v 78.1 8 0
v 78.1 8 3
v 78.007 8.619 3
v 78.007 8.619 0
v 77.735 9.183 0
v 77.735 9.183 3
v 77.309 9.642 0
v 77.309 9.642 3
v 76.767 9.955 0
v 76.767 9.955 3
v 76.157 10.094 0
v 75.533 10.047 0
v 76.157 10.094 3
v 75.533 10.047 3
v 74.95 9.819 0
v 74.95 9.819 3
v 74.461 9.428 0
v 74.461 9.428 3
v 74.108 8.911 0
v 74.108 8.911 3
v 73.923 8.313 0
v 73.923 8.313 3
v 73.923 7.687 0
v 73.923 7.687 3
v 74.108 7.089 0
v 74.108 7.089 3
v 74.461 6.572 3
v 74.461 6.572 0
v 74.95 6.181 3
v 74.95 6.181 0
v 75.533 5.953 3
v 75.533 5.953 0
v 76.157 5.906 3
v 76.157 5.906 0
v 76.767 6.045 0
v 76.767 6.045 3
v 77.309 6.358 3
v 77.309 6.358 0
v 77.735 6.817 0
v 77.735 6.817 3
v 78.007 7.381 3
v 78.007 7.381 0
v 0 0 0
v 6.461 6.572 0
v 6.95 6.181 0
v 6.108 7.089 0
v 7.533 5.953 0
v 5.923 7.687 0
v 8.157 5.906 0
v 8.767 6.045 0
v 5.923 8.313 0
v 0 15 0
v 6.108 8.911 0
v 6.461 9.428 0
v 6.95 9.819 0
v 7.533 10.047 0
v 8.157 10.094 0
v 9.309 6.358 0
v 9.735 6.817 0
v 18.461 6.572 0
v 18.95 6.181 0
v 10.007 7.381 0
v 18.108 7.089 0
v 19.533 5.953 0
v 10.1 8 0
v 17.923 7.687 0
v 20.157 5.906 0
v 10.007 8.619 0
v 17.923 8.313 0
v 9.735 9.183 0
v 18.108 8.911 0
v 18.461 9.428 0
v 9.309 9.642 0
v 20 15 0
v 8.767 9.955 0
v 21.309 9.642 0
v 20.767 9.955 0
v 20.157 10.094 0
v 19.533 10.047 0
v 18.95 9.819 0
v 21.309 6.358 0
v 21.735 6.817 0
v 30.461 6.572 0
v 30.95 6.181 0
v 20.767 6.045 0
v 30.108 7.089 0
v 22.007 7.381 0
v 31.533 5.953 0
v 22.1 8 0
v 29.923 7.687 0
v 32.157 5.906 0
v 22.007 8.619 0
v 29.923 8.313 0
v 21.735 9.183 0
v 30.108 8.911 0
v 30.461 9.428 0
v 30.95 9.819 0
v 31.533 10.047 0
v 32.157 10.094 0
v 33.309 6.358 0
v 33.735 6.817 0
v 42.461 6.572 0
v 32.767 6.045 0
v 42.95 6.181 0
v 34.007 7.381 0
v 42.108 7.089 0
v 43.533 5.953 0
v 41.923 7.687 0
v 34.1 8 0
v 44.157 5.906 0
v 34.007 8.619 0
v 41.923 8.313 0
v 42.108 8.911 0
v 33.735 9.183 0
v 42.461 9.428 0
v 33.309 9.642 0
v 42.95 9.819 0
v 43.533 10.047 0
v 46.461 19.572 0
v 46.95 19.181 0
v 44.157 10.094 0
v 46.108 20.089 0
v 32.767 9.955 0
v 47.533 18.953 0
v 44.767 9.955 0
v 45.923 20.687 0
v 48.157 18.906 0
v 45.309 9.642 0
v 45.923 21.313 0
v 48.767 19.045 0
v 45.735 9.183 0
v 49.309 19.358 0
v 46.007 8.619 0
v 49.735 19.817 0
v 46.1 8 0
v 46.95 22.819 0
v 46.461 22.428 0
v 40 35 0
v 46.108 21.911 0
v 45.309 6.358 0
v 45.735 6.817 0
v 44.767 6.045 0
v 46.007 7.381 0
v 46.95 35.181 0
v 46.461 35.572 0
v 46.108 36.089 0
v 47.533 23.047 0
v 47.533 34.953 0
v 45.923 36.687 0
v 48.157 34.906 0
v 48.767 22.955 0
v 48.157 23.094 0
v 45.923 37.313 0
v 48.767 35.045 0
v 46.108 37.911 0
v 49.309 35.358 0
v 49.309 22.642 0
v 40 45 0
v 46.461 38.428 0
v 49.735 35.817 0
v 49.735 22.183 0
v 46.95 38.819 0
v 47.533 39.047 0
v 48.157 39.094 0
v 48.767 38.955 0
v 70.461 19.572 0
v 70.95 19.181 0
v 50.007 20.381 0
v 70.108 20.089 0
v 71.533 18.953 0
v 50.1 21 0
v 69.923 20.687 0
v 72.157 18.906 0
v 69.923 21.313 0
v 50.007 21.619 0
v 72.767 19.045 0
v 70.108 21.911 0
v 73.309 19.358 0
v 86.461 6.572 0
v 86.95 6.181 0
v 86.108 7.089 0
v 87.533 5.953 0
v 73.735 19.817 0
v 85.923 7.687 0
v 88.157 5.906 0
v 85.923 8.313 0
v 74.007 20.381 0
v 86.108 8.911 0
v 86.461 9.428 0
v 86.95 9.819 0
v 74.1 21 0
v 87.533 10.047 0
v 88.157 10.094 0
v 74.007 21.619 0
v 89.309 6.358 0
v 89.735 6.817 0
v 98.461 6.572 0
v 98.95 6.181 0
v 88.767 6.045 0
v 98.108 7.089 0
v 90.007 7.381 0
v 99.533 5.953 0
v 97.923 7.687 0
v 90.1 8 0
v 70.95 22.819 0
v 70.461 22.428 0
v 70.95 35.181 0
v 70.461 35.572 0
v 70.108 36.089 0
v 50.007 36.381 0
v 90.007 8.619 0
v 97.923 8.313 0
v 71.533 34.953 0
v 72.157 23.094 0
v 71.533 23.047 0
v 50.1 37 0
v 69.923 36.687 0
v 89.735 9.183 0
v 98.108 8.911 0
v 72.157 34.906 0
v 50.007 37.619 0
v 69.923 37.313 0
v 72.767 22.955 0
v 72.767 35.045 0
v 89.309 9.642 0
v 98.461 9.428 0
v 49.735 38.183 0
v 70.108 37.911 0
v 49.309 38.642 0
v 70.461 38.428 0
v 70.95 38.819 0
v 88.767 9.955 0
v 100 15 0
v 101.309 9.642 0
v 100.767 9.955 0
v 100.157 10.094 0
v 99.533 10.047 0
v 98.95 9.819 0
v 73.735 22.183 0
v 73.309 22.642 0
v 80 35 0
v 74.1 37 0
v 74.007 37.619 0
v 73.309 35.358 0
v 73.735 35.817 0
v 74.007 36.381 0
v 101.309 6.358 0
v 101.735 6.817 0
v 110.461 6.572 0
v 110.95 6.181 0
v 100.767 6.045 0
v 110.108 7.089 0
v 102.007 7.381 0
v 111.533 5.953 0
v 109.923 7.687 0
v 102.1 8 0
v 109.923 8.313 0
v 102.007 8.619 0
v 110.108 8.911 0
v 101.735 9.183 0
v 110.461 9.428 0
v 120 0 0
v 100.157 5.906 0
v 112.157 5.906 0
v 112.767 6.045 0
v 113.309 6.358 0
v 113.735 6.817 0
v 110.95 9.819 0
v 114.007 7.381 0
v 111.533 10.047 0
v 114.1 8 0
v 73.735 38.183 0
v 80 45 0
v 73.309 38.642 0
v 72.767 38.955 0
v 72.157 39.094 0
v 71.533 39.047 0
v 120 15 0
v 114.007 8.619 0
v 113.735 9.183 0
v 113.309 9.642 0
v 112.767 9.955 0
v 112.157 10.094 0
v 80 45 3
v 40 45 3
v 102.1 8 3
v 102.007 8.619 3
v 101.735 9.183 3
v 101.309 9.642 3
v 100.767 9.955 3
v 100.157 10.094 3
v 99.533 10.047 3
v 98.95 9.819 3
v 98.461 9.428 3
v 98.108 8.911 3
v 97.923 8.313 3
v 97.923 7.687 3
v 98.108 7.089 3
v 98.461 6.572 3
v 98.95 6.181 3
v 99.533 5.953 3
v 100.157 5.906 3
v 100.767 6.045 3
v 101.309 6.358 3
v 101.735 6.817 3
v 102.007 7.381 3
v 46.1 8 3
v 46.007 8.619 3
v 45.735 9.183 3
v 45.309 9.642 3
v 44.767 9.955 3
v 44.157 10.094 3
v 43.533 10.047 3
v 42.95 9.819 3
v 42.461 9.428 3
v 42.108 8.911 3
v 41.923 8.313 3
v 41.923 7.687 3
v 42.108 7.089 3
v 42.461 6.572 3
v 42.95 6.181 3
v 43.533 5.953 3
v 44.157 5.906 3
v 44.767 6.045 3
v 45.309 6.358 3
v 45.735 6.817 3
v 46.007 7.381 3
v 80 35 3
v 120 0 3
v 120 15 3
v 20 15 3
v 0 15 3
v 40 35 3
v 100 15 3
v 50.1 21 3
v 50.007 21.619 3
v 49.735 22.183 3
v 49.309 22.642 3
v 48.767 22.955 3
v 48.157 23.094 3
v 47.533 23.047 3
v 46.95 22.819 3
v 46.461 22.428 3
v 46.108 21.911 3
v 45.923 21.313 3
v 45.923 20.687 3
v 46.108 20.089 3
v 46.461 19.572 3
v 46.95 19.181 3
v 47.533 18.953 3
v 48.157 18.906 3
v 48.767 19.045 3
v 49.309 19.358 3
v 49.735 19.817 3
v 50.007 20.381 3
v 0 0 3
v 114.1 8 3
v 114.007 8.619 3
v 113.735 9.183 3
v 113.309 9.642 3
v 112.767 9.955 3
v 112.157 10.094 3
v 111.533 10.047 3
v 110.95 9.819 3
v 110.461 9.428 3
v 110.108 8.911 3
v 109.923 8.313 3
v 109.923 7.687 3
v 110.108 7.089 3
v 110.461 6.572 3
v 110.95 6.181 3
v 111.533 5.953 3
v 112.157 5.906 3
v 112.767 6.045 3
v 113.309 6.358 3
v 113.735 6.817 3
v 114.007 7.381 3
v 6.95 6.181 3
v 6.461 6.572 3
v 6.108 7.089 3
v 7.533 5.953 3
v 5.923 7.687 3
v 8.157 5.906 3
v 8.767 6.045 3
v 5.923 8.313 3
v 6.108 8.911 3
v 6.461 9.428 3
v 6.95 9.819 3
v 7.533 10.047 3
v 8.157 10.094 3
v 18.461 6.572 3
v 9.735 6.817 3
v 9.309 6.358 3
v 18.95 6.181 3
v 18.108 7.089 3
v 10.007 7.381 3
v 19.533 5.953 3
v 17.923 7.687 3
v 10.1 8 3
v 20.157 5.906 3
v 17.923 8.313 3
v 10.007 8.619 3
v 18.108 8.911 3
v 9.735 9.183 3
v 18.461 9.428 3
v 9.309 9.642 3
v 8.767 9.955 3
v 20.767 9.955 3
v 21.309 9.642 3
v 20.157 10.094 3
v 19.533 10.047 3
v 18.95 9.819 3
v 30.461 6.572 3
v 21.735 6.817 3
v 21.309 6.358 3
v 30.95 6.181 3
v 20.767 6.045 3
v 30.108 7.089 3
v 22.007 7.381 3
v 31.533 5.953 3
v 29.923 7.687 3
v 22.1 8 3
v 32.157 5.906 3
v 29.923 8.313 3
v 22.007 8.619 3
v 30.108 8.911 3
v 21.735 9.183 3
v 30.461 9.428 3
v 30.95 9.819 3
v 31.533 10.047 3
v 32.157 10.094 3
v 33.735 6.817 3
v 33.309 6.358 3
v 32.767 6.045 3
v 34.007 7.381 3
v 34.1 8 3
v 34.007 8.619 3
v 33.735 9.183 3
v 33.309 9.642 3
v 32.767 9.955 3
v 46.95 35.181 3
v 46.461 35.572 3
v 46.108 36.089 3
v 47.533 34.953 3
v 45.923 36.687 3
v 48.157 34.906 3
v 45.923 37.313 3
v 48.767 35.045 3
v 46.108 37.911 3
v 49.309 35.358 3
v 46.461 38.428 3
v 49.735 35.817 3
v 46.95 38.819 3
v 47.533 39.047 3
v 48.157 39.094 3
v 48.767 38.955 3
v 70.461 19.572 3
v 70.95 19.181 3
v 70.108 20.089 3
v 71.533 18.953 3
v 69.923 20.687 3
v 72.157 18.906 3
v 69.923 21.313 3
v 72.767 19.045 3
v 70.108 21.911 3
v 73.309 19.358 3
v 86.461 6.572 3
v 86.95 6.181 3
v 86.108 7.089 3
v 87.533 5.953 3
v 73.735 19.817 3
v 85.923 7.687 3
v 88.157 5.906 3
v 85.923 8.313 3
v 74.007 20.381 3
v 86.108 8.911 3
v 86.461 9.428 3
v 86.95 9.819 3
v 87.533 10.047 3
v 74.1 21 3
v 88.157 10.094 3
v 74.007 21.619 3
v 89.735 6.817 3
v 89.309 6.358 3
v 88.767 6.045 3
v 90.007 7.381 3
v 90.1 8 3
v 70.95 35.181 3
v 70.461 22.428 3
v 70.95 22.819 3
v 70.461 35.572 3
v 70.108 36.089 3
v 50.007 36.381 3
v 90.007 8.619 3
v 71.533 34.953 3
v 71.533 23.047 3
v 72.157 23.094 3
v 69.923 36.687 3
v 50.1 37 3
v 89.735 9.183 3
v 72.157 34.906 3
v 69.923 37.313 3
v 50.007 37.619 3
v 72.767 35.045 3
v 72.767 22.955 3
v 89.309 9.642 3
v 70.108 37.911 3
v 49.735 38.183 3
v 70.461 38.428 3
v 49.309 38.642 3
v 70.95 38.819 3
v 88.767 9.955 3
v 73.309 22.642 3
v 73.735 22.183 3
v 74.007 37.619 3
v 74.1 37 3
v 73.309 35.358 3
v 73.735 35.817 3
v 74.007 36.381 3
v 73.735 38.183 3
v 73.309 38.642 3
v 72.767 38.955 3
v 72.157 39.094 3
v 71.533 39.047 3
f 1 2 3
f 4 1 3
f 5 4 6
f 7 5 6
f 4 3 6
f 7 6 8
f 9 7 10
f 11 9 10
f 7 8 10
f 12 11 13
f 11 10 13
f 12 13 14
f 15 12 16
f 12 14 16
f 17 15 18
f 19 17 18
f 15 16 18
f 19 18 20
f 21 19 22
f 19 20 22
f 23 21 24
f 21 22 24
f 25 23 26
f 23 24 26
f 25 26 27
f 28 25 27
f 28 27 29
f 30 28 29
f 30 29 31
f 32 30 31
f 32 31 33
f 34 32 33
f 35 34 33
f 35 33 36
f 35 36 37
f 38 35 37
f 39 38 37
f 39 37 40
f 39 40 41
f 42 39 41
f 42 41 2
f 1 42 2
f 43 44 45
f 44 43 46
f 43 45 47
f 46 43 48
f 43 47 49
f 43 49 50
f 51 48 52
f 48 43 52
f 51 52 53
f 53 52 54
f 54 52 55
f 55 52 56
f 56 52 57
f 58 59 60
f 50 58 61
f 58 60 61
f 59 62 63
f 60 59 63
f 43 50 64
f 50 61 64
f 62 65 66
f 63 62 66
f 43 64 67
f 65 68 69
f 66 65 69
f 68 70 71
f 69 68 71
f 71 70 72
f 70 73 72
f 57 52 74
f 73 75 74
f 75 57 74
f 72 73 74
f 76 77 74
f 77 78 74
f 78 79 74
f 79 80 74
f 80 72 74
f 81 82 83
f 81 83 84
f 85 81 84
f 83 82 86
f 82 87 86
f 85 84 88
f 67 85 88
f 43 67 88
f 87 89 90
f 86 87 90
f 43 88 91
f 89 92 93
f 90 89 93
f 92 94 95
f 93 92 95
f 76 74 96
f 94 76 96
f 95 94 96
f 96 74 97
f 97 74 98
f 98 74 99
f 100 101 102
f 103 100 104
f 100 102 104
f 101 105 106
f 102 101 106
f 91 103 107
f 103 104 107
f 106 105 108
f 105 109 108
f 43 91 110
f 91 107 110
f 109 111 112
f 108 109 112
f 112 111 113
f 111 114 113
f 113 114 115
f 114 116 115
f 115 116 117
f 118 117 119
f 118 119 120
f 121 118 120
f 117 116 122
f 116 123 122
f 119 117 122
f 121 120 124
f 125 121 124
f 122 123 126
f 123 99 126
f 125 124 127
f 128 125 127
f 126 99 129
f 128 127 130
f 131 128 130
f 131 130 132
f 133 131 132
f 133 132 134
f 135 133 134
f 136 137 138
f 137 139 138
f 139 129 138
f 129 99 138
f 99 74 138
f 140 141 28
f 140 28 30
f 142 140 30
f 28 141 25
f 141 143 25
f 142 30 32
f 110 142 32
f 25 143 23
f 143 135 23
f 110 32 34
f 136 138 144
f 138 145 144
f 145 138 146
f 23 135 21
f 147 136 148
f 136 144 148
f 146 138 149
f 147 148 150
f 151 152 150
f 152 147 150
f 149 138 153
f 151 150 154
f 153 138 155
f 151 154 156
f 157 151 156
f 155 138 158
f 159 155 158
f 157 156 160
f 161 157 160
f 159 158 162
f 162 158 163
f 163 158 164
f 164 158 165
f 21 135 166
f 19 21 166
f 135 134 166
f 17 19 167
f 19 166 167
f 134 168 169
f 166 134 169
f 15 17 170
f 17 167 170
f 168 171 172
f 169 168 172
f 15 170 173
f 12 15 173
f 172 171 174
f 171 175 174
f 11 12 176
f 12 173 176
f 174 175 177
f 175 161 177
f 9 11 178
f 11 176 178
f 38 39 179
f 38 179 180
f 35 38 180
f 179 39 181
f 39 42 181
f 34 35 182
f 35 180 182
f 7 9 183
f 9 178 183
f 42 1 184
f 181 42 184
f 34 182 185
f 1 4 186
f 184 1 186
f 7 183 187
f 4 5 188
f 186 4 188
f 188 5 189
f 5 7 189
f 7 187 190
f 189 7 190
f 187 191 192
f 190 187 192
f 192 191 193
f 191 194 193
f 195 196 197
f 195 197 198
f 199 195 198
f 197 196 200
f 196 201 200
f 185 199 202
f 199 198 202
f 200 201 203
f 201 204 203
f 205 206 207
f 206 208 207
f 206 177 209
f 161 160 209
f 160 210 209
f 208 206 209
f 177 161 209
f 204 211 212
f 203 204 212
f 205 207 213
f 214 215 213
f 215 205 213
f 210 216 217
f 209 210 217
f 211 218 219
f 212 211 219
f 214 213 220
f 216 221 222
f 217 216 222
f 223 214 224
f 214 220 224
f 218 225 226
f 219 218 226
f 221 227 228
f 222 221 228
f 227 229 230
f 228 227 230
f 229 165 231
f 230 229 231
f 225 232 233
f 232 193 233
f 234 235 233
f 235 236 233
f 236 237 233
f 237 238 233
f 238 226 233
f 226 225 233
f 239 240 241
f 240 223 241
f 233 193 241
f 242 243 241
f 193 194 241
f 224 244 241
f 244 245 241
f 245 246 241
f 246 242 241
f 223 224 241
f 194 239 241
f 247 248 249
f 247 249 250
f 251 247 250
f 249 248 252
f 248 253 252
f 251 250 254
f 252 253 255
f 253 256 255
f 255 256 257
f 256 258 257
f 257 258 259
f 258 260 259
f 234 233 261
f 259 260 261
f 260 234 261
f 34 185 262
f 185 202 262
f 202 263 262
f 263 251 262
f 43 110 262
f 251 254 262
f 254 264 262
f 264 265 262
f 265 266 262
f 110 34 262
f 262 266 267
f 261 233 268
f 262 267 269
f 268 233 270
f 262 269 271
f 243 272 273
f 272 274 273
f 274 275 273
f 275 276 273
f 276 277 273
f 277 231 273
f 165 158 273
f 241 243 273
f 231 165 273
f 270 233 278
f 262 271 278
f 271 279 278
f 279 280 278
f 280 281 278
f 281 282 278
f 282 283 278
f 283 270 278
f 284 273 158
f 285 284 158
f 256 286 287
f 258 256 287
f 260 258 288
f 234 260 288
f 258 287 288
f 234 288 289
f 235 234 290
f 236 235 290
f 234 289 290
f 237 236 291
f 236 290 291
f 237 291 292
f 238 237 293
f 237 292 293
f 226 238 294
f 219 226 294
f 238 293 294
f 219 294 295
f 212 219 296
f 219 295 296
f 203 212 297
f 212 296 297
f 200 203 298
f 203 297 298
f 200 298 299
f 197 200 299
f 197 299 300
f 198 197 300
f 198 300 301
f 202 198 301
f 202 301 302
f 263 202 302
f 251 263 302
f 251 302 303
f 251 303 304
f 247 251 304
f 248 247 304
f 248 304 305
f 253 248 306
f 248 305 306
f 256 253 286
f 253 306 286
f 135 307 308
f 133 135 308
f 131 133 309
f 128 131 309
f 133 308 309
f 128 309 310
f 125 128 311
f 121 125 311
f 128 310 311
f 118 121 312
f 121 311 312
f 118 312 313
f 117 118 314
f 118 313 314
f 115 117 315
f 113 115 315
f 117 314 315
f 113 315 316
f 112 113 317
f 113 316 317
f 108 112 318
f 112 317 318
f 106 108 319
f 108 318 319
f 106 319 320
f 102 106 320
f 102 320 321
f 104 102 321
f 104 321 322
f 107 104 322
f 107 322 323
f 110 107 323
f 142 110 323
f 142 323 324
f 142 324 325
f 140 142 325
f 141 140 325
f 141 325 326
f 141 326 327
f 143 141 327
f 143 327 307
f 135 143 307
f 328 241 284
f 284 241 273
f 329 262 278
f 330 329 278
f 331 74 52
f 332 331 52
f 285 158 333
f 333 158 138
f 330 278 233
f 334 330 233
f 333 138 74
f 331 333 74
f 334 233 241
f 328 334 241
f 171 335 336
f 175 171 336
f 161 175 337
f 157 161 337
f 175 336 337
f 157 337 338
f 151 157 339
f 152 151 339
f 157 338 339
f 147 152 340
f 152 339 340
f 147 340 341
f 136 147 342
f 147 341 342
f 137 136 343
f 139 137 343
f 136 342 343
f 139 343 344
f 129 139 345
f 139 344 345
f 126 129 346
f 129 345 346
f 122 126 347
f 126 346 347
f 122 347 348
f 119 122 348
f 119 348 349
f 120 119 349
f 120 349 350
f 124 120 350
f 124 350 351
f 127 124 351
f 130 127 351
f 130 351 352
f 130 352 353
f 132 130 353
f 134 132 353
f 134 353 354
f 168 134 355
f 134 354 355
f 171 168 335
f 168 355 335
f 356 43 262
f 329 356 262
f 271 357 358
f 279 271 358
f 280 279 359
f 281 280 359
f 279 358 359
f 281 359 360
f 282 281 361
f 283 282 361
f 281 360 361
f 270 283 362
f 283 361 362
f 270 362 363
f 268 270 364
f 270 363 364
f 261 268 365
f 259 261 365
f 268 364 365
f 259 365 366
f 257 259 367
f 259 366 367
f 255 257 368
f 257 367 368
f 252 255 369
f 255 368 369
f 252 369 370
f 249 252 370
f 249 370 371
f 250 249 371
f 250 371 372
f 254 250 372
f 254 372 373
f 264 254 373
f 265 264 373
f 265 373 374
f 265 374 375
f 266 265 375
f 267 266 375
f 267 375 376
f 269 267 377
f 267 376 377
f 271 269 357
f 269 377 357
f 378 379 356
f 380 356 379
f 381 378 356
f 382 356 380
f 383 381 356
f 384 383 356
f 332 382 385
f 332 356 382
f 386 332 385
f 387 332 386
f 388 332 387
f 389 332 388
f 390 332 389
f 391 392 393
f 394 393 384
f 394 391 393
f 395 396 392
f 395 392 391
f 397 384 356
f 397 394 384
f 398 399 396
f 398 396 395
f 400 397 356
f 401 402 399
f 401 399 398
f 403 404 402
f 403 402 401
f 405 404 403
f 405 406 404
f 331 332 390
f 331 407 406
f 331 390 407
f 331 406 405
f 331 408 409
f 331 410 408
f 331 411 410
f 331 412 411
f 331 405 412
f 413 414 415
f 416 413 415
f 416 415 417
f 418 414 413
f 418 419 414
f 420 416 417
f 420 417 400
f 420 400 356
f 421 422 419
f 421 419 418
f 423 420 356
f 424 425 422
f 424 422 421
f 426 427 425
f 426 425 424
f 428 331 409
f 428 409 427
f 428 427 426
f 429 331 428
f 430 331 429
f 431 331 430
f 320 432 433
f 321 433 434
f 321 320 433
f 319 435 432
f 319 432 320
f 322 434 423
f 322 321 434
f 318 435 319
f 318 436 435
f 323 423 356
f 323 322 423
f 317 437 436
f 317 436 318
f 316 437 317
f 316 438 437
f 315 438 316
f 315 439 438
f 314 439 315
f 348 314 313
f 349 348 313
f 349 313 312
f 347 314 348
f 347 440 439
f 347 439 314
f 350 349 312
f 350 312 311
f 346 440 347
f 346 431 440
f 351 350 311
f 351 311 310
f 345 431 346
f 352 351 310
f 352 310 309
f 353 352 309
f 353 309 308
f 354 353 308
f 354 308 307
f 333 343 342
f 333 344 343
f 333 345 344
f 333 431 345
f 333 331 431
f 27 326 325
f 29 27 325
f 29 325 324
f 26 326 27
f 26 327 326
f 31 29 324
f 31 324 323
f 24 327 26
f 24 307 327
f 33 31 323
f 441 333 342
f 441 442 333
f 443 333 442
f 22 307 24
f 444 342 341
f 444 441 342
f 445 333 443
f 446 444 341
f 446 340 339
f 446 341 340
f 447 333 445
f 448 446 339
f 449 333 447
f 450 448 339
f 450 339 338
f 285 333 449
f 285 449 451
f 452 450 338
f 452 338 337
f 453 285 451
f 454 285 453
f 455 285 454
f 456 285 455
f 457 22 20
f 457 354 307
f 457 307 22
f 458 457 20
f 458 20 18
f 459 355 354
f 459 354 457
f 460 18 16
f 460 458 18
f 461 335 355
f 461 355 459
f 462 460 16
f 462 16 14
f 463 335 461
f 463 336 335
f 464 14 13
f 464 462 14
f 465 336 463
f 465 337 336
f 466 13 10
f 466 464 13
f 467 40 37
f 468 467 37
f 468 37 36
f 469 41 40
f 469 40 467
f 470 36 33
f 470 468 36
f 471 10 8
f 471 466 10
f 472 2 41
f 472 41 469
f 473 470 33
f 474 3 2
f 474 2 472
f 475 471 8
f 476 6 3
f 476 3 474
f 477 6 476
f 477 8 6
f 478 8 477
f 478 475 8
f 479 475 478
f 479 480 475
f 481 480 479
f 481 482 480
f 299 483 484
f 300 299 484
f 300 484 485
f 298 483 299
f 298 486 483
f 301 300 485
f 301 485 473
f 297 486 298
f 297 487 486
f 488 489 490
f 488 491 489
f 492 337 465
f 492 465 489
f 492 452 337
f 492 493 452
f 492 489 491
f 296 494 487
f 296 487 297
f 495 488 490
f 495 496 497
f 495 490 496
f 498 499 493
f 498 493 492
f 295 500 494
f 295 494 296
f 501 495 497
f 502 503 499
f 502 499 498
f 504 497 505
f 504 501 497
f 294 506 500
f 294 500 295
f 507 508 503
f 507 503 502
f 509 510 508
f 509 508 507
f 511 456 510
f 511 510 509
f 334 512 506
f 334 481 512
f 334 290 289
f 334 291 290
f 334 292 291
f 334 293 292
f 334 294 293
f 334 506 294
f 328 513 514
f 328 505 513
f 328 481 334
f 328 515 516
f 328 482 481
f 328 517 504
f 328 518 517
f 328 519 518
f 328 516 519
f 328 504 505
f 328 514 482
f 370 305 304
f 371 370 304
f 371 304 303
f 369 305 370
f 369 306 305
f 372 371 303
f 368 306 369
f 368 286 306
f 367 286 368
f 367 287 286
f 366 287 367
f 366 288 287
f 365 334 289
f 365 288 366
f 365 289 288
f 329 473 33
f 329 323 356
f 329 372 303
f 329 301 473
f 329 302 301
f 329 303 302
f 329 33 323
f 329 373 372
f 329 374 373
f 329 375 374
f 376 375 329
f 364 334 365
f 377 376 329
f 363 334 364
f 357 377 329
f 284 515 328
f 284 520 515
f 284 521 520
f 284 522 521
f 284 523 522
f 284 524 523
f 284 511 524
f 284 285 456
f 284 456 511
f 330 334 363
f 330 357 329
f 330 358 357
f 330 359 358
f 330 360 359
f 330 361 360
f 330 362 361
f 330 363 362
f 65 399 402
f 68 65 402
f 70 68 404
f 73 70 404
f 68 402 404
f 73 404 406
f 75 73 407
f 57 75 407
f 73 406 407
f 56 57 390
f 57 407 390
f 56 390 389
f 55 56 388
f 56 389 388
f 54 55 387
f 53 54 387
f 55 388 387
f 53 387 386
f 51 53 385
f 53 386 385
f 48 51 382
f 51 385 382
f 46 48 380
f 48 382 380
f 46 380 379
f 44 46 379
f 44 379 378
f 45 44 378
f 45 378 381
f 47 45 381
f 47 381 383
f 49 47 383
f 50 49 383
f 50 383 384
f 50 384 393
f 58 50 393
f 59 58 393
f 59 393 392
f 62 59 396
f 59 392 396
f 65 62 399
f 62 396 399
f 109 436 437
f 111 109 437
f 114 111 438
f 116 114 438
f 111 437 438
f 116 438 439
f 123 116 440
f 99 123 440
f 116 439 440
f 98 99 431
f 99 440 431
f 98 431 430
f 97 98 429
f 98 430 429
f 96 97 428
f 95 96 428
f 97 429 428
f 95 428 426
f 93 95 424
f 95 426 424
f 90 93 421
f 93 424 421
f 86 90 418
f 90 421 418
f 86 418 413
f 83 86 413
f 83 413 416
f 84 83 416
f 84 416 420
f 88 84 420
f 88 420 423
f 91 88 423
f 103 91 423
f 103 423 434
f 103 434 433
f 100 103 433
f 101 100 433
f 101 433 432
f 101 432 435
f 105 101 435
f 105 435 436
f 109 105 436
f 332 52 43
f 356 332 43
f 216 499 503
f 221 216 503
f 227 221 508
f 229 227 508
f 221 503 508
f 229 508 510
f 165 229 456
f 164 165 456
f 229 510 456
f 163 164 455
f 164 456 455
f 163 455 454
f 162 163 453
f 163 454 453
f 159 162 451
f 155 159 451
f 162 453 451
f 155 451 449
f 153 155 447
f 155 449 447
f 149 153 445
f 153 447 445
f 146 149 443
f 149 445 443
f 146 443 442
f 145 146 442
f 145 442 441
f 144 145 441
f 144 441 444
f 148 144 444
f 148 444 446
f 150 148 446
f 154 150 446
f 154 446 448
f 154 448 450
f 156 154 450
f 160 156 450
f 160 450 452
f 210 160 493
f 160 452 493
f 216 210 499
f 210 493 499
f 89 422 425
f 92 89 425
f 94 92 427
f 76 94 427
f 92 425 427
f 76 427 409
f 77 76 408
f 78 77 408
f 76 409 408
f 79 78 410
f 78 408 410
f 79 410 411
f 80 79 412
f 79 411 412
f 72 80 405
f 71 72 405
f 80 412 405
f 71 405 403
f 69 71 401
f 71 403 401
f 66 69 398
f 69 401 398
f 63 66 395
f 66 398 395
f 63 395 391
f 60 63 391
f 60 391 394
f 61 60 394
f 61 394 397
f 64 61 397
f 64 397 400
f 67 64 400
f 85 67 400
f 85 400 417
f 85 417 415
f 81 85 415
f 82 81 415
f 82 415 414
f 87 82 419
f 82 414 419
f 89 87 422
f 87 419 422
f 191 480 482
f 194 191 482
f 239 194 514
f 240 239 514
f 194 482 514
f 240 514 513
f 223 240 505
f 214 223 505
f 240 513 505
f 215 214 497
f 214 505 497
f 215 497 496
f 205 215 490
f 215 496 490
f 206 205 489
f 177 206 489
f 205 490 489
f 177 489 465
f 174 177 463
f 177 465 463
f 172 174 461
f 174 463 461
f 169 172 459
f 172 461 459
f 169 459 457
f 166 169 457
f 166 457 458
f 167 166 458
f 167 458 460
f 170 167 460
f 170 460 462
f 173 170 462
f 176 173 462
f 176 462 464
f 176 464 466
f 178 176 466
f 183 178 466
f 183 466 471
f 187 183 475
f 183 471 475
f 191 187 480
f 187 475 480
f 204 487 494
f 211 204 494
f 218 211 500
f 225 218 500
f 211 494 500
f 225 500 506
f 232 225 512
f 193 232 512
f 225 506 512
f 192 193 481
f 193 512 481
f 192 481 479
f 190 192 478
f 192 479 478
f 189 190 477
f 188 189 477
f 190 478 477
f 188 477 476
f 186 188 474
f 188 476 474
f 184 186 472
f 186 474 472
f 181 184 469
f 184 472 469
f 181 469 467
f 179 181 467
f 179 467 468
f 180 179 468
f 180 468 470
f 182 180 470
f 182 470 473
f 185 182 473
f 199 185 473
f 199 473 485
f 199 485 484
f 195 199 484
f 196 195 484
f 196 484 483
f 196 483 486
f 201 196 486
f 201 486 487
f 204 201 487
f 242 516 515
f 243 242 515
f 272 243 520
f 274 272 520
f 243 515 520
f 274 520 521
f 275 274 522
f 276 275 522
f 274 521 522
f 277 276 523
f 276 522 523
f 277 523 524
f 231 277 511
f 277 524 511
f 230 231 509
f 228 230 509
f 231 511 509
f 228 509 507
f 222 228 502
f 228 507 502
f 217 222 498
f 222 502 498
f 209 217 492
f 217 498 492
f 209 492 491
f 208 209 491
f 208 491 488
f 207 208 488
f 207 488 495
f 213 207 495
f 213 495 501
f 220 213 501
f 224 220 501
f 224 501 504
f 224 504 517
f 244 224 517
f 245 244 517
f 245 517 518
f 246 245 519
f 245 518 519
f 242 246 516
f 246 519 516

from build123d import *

# Parameters (mm, degrees)
EXTRUDE_1_DEPTH     = 3
SKETCH_2_R          = 2.1
CUT_EXTRUDE_1_DEPTH = 3
SKETCH_3_R          = 2.1
CUT_EXTRUDE_2_DEPTH = 129.195163715


with BuildPart() as part:
    # 草图1 → 凸台-拉伸1 (new body)
    with BuildSketch(Plane.XY):
        Polygon((0, 0), (120, 0), (120, 15), (100, 15), (80, 35), (80, 45), (40, 45), (40, 35), (20, 15), (0, 15), align=None)
    extrude(amount=EXTRUDE_1_DEPTH)

    # 草图2 → 切除-拉伸1 (cut)
    with BuildSketch(Plane.XY.offset(3)):
        with Locations((48, 37)):
            Circle(SKETCH_2_R)
        with Locations((72, 37)):
            Circle(SKETCH_2_R)
        with Locations((48, 21)):
            Circle(SKETCH_2_R)
        with Locations((72, 21)):
            Circle(SKETCH_2_R)
        with Locations((8, 8)):
            Circle(SKETCH_2_R)
        with Locations((20, 8)):
            Circle(SKETCH_2_R)
        with Locations((100, 8)):
            Circle(SKETCH_2_R)
        with Locations((112, 8)):
            Circle(SKETCH_2_R)
    extrude(amount=-CUT_EXTRUDE_1_DEPTH, mode=Mode.SUBTRACT)

    # 草图3 → 切除-拉伸2 (cut, through all)
    with BuildSketch(Plane.XY.offset(3)):
        with Locations((32, 8)):
            Circle(SKETCH_3_R)
        with Locations((44, 8)):
            Circle(SKETCH_3_R)
        with Locations((76, 8)):
            Circle(SKETCH_3_R)
        with Locations((88, 8)):
            Circle(SKETCH_3_R)
    extrude(amount=-CUT_EXTRUDE_2_DEPTH, mode=Mode.SUBTRACT)


solid = part.part
